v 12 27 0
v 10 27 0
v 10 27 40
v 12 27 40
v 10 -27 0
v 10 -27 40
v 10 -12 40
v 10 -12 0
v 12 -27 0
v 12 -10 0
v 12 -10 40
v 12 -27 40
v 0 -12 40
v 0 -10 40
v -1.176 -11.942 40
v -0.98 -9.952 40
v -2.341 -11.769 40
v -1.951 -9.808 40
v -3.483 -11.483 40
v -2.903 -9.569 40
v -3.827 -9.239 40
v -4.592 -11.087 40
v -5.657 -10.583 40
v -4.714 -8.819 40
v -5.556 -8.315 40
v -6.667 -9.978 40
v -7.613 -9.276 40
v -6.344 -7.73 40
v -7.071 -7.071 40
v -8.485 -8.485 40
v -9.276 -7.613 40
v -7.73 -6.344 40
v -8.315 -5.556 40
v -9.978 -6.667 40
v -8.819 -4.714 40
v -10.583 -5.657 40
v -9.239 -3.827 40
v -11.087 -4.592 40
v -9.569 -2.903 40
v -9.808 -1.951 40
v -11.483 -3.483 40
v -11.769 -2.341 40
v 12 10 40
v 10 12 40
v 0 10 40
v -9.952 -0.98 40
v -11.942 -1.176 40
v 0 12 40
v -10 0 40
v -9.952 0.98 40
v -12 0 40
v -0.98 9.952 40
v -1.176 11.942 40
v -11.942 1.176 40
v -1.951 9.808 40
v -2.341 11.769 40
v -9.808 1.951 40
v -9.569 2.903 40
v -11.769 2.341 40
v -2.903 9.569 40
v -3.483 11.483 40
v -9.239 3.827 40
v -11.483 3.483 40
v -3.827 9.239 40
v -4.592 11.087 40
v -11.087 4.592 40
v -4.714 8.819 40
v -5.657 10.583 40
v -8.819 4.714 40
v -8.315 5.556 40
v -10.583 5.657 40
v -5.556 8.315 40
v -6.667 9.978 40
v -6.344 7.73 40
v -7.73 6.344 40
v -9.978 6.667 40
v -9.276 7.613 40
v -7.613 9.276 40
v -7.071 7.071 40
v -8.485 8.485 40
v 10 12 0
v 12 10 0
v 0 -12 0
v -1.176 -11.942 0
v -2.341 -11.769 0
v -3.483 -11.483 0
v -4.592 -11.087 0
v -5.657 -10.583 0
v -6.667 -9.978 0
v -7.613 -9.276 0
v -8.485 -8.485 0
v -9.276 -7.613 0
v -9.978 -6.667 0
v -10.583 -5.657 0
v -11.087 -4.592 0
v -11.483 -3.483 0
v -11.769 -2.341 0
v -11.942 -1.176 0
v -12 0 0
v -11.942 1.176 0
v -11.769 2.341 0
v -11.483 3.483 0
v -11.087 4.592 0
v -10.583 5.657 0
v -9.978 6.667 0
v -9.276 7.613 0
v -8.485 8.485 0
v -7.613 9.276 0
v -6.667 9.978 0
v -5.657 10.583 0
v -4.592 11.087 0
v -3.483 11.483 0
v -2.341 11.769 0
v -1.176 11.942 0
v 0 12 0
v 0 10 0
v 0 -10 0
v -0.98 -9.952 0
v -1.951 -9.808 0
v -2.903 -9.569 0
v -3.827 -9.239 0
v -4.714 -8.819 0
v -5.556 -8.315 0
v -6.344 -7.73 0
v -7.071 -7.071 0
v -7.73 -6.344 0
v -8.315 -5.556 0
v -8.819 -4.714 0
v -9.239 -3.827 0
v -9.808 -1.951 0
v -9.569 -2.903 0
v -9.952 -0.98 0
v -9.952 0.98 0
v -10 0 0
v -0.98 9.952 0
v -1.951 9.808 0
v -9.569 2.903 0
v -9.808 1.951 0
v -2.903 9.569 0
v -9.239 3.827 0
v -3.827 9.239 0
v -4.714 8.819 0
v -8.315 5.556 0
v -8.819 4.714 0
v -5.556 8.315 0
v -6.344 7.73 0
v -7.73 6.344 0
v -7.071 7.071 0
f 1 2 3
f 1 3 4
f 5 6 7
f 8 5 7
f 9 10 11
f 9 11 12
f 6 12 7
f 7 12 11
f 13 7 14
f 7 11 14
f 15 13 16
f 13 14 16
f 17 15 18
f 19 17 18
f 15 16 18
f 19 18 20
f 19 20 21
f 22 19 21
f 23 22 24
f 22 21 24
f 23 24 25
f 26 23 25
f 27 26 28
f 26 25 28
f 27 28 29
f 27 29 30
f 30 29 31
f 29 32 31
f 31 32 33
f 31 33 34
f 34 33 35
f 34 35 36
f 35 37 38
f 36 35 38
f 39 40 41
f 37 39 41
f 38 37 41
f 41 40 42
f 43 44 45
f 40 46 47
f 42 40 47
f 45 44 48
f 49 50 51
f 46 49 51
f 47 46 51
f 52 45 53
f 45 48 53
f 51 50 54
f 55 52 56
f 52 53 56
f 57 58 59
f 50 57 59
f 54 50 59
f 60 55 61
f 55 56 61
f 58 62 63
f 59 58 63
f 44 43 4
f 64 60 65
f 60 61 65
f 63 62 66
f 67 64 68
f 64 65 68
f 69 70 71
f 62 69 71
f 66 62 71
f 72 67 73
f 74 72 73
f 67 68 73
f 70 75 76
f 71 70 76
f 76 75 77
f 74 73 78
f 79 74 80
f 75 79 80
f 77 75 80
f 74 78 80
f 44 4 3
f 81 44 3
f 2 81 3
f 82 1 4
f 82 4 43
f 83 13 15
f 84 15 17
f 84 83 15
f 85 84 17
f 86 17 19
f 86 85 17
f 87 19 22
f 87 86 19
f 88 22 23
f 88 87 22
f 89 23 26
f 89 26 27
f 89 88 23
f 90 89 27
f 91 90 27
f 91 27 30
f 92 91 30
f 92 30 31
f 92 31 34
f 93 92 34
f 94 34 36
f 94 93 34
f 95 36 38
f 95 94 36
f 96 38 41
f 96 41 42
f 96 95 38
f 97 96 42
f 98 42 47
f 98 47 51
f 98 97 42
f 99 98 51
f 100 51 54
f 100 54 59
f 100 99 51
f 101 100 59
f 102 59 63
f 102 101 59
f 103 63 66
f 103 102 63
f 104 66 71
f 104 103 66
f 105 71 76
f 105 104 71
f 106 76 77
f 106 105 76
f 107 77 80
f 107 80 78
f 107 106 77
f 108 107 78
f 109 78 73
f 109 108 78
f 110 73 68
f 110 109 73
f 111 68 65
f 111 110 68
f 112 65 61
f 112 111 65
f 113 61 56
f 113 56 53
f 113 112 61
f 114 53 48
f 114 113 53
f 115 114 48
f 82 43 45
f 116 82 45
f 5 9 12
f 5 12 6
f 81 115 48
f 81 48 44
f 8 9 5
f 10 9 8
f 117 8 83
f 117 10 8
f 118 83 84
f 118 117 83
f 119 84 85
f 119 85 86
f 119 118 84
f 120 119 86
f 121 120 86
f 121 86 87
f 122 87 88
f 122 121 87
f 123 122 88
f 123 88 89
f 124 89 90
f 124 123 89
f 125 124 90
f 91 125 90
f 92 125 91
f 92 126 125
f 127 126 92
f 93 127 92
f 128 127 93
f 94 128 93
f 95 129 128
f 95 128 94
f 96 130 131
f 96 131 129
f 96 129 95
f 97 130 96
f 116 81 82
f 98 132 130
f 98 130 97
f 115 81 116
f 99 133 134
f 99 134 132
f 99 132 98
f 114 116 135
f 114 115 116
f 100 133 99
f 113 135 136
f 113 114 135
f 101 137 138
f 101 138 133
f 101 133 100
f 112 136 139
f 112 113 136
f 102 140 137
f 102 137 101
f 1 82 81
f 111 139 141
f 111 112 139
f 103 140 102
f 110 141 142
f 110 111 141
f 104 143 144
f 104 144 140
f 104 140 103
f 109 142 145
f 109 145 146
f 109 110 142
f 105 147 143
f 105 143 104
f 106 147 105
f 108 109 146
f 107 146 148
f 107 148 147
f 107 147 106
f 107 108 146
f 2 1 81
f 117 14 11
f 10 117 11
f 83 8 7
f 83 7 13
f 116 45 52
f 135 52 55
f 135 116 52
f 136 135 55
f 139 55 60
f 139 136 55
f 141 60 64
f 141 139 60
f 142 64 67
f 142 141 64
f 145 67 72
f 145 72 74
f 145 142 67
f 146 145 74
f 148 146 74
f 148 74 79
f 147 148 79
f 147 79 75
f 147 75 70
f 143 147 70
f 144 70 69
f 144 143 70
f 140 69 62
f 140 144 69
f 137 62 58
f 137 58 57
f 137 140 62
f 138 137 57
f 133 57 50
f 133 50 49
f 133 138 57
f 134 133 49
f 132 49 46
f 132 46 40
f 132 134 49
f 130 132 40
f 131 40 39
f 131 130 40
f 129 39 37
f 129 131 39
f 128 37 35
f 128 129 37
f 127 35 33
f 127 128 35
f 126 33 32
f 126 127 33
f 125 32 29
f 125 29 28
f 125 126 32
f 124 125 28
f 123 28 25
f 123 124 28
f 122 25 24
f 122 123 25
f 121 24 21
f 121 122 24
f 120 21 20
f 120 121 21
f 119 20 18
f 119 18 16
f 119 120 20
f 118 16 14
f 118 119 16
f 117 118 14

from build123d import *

# Parameters (mm, degrees)
BOSS_EXTRUDE1_DEPTH = 40


with BuildPart() as part:
    # Sketch1 → Boss-Extrude1 (new body)
    with BuildSketch(Plane.XY):
        with BuildLine():
            Line((0, 12), (10, 12))
            Line((10, 12), (10, 27))
            Line((10, 27), (12, 27))
            Line((12, 27), (12, 10))
            Line((12, 10), (0, 10))
            ThreePointArc((0, 10), (-10, 0), (0, -10))
            Line((0, -10), (12, -10))
            Line((12, -10), (12, -27))
            Line((12, -27), (10, -27))
            Line((10, -27), (10, -12))
            Line((10, -12), (0, -12))
            ThreePointArc((0, -12), (-12, 0), (0, 12))
        make_face()
    extrude(amount=BOSS_EXTRUDE1_DEPTH)


solid = part.part
